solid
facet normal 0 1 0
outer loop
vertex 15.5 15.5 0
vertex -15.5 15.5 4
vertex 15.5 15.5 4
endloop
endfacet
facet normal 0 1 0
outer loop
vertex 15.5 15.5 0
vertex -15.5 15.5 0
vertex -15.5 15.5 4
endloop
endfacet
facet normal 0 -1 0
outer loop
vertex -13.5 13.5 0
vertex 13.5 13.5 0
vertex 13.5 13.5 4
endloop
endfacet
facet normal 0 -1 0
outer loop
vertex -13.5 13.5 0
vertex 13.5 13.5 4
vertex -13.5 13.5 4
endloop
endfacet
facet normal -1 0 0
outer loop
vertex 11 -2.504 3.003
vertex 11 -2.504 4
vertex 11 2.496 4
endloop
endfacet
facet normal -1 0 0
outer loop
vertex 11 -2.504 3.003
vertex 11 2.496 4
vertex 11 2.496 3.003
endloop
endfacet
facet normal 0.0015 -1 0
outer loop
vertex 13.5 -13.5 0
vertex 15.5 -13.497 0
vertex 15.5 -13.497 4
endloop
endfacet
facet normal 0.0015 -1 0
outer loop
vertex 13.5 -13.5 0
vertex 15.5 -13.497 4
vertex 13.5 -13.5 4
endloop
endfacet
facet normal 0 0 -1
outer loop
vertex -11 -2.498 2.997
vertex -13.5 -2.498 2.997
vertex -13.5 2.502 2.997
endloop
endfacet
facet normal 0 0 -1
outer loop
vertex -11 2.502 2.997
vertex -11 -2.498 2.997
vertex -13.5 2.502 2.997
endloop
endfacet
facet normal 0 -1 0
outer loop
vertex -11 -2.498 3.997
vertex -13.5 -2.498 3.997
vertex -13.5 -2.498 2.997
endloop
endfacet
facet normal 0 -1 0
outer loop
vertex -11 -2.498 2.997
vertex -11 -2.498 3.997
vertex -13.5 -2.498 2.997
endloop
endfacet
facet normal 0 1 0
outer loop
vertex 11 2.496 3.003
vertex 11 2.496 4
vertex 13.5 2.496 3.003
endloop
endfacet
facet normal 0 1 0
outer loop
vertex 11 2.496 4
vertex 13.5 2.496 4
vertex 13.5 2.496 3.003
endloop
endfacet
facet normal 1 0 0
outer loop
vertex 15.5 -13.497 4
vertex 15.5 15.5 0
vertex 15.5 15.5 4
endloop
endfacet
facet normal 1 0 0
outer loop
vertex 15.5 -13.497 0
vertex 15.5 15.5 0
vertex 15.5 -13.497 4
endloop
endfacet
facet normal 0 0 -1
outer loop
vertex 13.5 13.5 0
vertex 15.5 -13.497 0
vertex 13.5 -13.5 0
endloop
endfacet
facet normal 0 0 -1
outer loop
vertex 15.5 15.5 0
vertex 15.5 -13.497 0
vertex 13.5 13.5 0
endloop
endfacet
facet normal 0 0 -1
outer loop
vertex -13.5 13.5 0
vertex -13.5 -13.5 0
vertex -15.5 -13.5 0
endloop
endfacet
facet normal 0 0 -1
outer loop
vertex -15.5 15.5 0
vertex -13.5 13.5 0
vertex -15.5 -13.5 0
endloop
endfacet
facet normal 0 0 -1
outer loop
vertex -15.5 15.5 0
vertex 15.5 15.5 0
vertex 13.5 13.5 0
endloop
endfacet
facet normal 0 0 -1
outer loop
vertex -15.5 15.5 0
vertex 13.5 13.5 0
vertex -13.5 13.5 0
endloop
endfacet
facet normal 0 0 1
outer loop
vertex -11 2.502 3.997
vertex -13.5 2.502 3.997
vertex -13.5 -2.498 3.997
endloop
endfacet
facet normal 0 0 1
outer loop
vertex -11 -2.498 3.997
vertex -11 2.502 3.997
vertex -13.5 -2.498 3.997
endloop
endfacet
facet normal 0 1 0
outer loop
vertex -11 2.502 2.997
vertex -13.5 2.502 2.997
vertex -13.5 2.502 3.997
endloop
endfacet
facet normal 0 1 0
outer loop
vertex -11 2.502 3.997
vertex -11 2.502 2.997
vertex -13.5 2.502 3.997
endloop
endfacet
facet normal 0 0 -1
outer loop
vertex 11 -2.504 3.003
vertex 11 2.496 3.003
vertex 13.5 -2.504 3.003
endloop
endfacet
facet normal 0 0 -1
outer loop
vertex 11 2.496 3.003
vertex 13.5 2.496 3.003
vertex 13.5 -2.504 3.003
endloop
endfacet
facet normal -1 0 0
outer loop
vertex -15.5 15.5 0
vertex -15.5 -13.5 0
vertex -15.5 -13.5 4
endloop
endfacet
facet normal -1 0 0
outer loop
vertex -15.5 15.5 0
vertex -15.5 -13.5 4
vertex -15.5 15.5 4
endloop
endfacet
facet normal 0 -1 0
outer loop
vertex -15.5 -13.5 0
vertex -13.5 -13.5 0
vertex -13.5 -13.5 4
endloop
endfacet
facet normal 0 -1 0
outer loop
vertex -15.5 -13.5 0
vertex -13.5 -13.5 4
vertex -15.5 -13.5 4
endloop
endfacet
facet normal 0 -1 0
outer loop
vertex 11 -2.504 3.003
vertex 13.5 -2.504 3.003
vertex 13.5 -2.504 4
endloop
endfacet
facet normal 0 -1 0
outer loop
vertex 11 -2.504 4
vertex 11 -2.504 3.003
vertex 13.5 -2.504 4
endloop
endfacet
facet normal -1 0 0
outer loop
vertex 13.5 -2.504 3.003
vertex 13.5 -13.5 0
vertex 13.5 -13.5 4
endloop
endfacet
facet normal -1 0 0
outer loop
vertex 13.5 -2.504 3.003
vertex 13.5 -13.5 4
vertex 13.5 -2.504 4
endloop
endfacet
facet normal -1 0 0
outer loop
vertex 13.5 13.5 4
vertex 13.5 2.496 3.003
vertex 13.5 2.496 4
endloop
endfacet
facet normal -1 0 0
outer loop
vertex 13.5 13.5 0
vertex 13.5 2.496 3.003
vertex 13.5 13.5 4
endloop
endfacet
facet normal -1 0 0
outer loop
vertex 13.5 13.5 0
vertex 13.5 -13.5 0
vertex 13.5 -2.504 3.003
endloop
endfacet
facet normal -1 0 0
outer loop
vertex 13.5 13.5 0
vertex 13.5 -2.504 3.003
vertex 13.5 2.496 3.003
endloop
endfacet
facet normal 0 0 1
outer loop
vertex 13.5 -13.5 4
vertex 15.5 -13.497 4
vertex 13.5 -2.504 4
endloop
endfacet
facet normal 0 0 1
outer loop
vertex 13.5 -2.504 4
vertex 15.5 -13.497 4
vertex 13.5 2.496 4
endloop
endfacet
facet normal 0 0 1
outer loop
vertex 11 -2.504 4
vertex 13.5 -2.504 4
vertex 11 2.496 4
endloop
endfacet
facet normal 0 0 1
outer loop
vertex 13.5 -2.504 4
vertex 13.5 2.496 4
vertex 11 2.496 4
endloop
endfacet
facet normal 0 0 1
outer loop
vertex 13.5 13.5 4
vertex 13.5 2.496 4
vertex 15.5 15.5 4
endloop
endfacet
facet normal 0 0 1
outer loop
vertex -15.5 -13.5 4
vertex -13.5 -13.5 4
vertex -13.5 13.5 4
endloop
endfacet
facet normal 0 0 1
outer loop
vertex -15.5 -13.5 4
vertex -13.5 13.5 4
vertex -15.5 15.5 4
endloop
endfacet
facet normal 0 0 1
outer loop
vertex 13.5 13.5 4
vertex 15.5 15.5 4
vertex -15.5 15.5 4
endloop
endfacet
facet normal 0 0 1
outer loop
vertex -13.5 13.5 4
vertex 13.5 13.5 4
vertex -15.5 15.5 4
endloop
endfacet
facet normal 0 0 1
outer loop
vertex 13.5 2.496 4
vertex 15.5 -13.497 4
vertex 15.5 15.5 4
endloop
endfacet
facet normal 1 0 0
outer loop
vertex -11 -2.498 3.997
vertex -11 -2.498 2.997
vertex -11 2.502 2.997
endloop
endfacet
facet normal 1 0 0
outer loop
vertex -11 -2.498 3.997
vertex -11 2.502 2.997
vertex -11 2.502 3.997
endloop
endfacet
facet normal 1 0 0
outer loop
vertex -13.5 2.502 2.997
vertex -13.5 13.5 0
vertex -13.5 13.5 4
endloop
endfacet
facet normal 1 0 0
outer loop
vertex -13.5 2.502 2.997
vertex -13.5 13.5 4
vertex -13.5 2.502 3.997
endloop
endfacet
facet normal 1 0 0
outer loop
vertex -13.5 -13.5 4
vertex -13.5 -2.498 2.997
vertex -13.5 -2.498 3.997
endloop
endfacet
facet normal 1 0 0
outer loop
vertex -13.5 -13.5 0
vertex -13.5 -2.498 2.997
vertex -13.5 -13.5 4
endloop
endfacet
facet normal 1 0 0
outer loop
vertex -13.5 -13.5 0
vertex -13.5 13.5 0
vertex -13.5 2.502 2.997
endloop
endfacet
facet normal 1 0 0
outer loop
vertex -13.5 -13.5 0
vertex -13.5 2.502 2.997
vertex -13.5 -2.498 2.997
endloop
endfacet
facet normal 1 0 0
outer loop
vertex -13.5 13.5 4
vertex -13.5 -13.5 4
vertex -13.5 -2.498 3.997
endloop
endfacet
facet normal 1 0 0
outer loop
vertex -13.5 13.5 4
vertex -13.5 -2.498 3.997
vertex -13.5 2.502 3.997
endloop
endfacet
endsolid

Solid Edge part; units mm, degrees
sketch "Sketch1" plane through (0, 0, 0) normal (0, 0, 1) x (1, 0, 0)
  line L0 (15.5, -13.4968) -> (13.5, -13.5001)
  line L1 (13.5, -13.5001) -> (13.5, 13.4999)
  line L2 (13.5, 13.4999) -> (-13.5, 13.4999)
  line L3 (-13.5, 13.4999) -> (-13.5, -13.5001)
  line L4 (-13.5, -13.5001) -> (-15.5, -13.5001)
  line L5 (-15.5, -13.5001) -> (-15.5, 15.4999)
  line L6 (-15.5, 15.4999) -> (15.5, 15.4999)
  line L7 (15.5, 15.4999) -> (15.5, -13.5001)
extrude "Protrusion1" add sketch "Sketch1" along normal blind 4
sketch "Sketch2" plane through (-13.5, -0.0001, 2) normal (1, 0, 0) x (0, 1, 0)
  line L0 (-2.4979, 1.9971) -> (-2.4979, 0.9971)
  line L1 (-2.4979, 0.9971) -> (2.5021, 0.9971)
  line L2 (2.5021, 0.9971) -> (2.5021, 1.9971)
  line L3 (2.5021, 1.9971) -> (-2.4979, 1.9971)
extrude "ExtrudedProtrusion_10" add sketch "Sketch2" along normal blind 2.5
sketch "Sketch3" plane through (13.5, -0.0001, 2) normal (-1, 0, 0) x (0, -1, 0)
  line L0 (2.5034, 2) -> (-2.4966, 2)
  line L1 (-2.4966, 2) -> (-2.4966, 1.0032)
  line L2 (-2.4966, 1.0032) -> (2.5034, 1.0032)
  line L3 (2.5034, 1.0032) -> (2.5034, 2)
extrude "ExtrudedProtrusion_11" add sketch "Sketch3" along normal blind 2.5
